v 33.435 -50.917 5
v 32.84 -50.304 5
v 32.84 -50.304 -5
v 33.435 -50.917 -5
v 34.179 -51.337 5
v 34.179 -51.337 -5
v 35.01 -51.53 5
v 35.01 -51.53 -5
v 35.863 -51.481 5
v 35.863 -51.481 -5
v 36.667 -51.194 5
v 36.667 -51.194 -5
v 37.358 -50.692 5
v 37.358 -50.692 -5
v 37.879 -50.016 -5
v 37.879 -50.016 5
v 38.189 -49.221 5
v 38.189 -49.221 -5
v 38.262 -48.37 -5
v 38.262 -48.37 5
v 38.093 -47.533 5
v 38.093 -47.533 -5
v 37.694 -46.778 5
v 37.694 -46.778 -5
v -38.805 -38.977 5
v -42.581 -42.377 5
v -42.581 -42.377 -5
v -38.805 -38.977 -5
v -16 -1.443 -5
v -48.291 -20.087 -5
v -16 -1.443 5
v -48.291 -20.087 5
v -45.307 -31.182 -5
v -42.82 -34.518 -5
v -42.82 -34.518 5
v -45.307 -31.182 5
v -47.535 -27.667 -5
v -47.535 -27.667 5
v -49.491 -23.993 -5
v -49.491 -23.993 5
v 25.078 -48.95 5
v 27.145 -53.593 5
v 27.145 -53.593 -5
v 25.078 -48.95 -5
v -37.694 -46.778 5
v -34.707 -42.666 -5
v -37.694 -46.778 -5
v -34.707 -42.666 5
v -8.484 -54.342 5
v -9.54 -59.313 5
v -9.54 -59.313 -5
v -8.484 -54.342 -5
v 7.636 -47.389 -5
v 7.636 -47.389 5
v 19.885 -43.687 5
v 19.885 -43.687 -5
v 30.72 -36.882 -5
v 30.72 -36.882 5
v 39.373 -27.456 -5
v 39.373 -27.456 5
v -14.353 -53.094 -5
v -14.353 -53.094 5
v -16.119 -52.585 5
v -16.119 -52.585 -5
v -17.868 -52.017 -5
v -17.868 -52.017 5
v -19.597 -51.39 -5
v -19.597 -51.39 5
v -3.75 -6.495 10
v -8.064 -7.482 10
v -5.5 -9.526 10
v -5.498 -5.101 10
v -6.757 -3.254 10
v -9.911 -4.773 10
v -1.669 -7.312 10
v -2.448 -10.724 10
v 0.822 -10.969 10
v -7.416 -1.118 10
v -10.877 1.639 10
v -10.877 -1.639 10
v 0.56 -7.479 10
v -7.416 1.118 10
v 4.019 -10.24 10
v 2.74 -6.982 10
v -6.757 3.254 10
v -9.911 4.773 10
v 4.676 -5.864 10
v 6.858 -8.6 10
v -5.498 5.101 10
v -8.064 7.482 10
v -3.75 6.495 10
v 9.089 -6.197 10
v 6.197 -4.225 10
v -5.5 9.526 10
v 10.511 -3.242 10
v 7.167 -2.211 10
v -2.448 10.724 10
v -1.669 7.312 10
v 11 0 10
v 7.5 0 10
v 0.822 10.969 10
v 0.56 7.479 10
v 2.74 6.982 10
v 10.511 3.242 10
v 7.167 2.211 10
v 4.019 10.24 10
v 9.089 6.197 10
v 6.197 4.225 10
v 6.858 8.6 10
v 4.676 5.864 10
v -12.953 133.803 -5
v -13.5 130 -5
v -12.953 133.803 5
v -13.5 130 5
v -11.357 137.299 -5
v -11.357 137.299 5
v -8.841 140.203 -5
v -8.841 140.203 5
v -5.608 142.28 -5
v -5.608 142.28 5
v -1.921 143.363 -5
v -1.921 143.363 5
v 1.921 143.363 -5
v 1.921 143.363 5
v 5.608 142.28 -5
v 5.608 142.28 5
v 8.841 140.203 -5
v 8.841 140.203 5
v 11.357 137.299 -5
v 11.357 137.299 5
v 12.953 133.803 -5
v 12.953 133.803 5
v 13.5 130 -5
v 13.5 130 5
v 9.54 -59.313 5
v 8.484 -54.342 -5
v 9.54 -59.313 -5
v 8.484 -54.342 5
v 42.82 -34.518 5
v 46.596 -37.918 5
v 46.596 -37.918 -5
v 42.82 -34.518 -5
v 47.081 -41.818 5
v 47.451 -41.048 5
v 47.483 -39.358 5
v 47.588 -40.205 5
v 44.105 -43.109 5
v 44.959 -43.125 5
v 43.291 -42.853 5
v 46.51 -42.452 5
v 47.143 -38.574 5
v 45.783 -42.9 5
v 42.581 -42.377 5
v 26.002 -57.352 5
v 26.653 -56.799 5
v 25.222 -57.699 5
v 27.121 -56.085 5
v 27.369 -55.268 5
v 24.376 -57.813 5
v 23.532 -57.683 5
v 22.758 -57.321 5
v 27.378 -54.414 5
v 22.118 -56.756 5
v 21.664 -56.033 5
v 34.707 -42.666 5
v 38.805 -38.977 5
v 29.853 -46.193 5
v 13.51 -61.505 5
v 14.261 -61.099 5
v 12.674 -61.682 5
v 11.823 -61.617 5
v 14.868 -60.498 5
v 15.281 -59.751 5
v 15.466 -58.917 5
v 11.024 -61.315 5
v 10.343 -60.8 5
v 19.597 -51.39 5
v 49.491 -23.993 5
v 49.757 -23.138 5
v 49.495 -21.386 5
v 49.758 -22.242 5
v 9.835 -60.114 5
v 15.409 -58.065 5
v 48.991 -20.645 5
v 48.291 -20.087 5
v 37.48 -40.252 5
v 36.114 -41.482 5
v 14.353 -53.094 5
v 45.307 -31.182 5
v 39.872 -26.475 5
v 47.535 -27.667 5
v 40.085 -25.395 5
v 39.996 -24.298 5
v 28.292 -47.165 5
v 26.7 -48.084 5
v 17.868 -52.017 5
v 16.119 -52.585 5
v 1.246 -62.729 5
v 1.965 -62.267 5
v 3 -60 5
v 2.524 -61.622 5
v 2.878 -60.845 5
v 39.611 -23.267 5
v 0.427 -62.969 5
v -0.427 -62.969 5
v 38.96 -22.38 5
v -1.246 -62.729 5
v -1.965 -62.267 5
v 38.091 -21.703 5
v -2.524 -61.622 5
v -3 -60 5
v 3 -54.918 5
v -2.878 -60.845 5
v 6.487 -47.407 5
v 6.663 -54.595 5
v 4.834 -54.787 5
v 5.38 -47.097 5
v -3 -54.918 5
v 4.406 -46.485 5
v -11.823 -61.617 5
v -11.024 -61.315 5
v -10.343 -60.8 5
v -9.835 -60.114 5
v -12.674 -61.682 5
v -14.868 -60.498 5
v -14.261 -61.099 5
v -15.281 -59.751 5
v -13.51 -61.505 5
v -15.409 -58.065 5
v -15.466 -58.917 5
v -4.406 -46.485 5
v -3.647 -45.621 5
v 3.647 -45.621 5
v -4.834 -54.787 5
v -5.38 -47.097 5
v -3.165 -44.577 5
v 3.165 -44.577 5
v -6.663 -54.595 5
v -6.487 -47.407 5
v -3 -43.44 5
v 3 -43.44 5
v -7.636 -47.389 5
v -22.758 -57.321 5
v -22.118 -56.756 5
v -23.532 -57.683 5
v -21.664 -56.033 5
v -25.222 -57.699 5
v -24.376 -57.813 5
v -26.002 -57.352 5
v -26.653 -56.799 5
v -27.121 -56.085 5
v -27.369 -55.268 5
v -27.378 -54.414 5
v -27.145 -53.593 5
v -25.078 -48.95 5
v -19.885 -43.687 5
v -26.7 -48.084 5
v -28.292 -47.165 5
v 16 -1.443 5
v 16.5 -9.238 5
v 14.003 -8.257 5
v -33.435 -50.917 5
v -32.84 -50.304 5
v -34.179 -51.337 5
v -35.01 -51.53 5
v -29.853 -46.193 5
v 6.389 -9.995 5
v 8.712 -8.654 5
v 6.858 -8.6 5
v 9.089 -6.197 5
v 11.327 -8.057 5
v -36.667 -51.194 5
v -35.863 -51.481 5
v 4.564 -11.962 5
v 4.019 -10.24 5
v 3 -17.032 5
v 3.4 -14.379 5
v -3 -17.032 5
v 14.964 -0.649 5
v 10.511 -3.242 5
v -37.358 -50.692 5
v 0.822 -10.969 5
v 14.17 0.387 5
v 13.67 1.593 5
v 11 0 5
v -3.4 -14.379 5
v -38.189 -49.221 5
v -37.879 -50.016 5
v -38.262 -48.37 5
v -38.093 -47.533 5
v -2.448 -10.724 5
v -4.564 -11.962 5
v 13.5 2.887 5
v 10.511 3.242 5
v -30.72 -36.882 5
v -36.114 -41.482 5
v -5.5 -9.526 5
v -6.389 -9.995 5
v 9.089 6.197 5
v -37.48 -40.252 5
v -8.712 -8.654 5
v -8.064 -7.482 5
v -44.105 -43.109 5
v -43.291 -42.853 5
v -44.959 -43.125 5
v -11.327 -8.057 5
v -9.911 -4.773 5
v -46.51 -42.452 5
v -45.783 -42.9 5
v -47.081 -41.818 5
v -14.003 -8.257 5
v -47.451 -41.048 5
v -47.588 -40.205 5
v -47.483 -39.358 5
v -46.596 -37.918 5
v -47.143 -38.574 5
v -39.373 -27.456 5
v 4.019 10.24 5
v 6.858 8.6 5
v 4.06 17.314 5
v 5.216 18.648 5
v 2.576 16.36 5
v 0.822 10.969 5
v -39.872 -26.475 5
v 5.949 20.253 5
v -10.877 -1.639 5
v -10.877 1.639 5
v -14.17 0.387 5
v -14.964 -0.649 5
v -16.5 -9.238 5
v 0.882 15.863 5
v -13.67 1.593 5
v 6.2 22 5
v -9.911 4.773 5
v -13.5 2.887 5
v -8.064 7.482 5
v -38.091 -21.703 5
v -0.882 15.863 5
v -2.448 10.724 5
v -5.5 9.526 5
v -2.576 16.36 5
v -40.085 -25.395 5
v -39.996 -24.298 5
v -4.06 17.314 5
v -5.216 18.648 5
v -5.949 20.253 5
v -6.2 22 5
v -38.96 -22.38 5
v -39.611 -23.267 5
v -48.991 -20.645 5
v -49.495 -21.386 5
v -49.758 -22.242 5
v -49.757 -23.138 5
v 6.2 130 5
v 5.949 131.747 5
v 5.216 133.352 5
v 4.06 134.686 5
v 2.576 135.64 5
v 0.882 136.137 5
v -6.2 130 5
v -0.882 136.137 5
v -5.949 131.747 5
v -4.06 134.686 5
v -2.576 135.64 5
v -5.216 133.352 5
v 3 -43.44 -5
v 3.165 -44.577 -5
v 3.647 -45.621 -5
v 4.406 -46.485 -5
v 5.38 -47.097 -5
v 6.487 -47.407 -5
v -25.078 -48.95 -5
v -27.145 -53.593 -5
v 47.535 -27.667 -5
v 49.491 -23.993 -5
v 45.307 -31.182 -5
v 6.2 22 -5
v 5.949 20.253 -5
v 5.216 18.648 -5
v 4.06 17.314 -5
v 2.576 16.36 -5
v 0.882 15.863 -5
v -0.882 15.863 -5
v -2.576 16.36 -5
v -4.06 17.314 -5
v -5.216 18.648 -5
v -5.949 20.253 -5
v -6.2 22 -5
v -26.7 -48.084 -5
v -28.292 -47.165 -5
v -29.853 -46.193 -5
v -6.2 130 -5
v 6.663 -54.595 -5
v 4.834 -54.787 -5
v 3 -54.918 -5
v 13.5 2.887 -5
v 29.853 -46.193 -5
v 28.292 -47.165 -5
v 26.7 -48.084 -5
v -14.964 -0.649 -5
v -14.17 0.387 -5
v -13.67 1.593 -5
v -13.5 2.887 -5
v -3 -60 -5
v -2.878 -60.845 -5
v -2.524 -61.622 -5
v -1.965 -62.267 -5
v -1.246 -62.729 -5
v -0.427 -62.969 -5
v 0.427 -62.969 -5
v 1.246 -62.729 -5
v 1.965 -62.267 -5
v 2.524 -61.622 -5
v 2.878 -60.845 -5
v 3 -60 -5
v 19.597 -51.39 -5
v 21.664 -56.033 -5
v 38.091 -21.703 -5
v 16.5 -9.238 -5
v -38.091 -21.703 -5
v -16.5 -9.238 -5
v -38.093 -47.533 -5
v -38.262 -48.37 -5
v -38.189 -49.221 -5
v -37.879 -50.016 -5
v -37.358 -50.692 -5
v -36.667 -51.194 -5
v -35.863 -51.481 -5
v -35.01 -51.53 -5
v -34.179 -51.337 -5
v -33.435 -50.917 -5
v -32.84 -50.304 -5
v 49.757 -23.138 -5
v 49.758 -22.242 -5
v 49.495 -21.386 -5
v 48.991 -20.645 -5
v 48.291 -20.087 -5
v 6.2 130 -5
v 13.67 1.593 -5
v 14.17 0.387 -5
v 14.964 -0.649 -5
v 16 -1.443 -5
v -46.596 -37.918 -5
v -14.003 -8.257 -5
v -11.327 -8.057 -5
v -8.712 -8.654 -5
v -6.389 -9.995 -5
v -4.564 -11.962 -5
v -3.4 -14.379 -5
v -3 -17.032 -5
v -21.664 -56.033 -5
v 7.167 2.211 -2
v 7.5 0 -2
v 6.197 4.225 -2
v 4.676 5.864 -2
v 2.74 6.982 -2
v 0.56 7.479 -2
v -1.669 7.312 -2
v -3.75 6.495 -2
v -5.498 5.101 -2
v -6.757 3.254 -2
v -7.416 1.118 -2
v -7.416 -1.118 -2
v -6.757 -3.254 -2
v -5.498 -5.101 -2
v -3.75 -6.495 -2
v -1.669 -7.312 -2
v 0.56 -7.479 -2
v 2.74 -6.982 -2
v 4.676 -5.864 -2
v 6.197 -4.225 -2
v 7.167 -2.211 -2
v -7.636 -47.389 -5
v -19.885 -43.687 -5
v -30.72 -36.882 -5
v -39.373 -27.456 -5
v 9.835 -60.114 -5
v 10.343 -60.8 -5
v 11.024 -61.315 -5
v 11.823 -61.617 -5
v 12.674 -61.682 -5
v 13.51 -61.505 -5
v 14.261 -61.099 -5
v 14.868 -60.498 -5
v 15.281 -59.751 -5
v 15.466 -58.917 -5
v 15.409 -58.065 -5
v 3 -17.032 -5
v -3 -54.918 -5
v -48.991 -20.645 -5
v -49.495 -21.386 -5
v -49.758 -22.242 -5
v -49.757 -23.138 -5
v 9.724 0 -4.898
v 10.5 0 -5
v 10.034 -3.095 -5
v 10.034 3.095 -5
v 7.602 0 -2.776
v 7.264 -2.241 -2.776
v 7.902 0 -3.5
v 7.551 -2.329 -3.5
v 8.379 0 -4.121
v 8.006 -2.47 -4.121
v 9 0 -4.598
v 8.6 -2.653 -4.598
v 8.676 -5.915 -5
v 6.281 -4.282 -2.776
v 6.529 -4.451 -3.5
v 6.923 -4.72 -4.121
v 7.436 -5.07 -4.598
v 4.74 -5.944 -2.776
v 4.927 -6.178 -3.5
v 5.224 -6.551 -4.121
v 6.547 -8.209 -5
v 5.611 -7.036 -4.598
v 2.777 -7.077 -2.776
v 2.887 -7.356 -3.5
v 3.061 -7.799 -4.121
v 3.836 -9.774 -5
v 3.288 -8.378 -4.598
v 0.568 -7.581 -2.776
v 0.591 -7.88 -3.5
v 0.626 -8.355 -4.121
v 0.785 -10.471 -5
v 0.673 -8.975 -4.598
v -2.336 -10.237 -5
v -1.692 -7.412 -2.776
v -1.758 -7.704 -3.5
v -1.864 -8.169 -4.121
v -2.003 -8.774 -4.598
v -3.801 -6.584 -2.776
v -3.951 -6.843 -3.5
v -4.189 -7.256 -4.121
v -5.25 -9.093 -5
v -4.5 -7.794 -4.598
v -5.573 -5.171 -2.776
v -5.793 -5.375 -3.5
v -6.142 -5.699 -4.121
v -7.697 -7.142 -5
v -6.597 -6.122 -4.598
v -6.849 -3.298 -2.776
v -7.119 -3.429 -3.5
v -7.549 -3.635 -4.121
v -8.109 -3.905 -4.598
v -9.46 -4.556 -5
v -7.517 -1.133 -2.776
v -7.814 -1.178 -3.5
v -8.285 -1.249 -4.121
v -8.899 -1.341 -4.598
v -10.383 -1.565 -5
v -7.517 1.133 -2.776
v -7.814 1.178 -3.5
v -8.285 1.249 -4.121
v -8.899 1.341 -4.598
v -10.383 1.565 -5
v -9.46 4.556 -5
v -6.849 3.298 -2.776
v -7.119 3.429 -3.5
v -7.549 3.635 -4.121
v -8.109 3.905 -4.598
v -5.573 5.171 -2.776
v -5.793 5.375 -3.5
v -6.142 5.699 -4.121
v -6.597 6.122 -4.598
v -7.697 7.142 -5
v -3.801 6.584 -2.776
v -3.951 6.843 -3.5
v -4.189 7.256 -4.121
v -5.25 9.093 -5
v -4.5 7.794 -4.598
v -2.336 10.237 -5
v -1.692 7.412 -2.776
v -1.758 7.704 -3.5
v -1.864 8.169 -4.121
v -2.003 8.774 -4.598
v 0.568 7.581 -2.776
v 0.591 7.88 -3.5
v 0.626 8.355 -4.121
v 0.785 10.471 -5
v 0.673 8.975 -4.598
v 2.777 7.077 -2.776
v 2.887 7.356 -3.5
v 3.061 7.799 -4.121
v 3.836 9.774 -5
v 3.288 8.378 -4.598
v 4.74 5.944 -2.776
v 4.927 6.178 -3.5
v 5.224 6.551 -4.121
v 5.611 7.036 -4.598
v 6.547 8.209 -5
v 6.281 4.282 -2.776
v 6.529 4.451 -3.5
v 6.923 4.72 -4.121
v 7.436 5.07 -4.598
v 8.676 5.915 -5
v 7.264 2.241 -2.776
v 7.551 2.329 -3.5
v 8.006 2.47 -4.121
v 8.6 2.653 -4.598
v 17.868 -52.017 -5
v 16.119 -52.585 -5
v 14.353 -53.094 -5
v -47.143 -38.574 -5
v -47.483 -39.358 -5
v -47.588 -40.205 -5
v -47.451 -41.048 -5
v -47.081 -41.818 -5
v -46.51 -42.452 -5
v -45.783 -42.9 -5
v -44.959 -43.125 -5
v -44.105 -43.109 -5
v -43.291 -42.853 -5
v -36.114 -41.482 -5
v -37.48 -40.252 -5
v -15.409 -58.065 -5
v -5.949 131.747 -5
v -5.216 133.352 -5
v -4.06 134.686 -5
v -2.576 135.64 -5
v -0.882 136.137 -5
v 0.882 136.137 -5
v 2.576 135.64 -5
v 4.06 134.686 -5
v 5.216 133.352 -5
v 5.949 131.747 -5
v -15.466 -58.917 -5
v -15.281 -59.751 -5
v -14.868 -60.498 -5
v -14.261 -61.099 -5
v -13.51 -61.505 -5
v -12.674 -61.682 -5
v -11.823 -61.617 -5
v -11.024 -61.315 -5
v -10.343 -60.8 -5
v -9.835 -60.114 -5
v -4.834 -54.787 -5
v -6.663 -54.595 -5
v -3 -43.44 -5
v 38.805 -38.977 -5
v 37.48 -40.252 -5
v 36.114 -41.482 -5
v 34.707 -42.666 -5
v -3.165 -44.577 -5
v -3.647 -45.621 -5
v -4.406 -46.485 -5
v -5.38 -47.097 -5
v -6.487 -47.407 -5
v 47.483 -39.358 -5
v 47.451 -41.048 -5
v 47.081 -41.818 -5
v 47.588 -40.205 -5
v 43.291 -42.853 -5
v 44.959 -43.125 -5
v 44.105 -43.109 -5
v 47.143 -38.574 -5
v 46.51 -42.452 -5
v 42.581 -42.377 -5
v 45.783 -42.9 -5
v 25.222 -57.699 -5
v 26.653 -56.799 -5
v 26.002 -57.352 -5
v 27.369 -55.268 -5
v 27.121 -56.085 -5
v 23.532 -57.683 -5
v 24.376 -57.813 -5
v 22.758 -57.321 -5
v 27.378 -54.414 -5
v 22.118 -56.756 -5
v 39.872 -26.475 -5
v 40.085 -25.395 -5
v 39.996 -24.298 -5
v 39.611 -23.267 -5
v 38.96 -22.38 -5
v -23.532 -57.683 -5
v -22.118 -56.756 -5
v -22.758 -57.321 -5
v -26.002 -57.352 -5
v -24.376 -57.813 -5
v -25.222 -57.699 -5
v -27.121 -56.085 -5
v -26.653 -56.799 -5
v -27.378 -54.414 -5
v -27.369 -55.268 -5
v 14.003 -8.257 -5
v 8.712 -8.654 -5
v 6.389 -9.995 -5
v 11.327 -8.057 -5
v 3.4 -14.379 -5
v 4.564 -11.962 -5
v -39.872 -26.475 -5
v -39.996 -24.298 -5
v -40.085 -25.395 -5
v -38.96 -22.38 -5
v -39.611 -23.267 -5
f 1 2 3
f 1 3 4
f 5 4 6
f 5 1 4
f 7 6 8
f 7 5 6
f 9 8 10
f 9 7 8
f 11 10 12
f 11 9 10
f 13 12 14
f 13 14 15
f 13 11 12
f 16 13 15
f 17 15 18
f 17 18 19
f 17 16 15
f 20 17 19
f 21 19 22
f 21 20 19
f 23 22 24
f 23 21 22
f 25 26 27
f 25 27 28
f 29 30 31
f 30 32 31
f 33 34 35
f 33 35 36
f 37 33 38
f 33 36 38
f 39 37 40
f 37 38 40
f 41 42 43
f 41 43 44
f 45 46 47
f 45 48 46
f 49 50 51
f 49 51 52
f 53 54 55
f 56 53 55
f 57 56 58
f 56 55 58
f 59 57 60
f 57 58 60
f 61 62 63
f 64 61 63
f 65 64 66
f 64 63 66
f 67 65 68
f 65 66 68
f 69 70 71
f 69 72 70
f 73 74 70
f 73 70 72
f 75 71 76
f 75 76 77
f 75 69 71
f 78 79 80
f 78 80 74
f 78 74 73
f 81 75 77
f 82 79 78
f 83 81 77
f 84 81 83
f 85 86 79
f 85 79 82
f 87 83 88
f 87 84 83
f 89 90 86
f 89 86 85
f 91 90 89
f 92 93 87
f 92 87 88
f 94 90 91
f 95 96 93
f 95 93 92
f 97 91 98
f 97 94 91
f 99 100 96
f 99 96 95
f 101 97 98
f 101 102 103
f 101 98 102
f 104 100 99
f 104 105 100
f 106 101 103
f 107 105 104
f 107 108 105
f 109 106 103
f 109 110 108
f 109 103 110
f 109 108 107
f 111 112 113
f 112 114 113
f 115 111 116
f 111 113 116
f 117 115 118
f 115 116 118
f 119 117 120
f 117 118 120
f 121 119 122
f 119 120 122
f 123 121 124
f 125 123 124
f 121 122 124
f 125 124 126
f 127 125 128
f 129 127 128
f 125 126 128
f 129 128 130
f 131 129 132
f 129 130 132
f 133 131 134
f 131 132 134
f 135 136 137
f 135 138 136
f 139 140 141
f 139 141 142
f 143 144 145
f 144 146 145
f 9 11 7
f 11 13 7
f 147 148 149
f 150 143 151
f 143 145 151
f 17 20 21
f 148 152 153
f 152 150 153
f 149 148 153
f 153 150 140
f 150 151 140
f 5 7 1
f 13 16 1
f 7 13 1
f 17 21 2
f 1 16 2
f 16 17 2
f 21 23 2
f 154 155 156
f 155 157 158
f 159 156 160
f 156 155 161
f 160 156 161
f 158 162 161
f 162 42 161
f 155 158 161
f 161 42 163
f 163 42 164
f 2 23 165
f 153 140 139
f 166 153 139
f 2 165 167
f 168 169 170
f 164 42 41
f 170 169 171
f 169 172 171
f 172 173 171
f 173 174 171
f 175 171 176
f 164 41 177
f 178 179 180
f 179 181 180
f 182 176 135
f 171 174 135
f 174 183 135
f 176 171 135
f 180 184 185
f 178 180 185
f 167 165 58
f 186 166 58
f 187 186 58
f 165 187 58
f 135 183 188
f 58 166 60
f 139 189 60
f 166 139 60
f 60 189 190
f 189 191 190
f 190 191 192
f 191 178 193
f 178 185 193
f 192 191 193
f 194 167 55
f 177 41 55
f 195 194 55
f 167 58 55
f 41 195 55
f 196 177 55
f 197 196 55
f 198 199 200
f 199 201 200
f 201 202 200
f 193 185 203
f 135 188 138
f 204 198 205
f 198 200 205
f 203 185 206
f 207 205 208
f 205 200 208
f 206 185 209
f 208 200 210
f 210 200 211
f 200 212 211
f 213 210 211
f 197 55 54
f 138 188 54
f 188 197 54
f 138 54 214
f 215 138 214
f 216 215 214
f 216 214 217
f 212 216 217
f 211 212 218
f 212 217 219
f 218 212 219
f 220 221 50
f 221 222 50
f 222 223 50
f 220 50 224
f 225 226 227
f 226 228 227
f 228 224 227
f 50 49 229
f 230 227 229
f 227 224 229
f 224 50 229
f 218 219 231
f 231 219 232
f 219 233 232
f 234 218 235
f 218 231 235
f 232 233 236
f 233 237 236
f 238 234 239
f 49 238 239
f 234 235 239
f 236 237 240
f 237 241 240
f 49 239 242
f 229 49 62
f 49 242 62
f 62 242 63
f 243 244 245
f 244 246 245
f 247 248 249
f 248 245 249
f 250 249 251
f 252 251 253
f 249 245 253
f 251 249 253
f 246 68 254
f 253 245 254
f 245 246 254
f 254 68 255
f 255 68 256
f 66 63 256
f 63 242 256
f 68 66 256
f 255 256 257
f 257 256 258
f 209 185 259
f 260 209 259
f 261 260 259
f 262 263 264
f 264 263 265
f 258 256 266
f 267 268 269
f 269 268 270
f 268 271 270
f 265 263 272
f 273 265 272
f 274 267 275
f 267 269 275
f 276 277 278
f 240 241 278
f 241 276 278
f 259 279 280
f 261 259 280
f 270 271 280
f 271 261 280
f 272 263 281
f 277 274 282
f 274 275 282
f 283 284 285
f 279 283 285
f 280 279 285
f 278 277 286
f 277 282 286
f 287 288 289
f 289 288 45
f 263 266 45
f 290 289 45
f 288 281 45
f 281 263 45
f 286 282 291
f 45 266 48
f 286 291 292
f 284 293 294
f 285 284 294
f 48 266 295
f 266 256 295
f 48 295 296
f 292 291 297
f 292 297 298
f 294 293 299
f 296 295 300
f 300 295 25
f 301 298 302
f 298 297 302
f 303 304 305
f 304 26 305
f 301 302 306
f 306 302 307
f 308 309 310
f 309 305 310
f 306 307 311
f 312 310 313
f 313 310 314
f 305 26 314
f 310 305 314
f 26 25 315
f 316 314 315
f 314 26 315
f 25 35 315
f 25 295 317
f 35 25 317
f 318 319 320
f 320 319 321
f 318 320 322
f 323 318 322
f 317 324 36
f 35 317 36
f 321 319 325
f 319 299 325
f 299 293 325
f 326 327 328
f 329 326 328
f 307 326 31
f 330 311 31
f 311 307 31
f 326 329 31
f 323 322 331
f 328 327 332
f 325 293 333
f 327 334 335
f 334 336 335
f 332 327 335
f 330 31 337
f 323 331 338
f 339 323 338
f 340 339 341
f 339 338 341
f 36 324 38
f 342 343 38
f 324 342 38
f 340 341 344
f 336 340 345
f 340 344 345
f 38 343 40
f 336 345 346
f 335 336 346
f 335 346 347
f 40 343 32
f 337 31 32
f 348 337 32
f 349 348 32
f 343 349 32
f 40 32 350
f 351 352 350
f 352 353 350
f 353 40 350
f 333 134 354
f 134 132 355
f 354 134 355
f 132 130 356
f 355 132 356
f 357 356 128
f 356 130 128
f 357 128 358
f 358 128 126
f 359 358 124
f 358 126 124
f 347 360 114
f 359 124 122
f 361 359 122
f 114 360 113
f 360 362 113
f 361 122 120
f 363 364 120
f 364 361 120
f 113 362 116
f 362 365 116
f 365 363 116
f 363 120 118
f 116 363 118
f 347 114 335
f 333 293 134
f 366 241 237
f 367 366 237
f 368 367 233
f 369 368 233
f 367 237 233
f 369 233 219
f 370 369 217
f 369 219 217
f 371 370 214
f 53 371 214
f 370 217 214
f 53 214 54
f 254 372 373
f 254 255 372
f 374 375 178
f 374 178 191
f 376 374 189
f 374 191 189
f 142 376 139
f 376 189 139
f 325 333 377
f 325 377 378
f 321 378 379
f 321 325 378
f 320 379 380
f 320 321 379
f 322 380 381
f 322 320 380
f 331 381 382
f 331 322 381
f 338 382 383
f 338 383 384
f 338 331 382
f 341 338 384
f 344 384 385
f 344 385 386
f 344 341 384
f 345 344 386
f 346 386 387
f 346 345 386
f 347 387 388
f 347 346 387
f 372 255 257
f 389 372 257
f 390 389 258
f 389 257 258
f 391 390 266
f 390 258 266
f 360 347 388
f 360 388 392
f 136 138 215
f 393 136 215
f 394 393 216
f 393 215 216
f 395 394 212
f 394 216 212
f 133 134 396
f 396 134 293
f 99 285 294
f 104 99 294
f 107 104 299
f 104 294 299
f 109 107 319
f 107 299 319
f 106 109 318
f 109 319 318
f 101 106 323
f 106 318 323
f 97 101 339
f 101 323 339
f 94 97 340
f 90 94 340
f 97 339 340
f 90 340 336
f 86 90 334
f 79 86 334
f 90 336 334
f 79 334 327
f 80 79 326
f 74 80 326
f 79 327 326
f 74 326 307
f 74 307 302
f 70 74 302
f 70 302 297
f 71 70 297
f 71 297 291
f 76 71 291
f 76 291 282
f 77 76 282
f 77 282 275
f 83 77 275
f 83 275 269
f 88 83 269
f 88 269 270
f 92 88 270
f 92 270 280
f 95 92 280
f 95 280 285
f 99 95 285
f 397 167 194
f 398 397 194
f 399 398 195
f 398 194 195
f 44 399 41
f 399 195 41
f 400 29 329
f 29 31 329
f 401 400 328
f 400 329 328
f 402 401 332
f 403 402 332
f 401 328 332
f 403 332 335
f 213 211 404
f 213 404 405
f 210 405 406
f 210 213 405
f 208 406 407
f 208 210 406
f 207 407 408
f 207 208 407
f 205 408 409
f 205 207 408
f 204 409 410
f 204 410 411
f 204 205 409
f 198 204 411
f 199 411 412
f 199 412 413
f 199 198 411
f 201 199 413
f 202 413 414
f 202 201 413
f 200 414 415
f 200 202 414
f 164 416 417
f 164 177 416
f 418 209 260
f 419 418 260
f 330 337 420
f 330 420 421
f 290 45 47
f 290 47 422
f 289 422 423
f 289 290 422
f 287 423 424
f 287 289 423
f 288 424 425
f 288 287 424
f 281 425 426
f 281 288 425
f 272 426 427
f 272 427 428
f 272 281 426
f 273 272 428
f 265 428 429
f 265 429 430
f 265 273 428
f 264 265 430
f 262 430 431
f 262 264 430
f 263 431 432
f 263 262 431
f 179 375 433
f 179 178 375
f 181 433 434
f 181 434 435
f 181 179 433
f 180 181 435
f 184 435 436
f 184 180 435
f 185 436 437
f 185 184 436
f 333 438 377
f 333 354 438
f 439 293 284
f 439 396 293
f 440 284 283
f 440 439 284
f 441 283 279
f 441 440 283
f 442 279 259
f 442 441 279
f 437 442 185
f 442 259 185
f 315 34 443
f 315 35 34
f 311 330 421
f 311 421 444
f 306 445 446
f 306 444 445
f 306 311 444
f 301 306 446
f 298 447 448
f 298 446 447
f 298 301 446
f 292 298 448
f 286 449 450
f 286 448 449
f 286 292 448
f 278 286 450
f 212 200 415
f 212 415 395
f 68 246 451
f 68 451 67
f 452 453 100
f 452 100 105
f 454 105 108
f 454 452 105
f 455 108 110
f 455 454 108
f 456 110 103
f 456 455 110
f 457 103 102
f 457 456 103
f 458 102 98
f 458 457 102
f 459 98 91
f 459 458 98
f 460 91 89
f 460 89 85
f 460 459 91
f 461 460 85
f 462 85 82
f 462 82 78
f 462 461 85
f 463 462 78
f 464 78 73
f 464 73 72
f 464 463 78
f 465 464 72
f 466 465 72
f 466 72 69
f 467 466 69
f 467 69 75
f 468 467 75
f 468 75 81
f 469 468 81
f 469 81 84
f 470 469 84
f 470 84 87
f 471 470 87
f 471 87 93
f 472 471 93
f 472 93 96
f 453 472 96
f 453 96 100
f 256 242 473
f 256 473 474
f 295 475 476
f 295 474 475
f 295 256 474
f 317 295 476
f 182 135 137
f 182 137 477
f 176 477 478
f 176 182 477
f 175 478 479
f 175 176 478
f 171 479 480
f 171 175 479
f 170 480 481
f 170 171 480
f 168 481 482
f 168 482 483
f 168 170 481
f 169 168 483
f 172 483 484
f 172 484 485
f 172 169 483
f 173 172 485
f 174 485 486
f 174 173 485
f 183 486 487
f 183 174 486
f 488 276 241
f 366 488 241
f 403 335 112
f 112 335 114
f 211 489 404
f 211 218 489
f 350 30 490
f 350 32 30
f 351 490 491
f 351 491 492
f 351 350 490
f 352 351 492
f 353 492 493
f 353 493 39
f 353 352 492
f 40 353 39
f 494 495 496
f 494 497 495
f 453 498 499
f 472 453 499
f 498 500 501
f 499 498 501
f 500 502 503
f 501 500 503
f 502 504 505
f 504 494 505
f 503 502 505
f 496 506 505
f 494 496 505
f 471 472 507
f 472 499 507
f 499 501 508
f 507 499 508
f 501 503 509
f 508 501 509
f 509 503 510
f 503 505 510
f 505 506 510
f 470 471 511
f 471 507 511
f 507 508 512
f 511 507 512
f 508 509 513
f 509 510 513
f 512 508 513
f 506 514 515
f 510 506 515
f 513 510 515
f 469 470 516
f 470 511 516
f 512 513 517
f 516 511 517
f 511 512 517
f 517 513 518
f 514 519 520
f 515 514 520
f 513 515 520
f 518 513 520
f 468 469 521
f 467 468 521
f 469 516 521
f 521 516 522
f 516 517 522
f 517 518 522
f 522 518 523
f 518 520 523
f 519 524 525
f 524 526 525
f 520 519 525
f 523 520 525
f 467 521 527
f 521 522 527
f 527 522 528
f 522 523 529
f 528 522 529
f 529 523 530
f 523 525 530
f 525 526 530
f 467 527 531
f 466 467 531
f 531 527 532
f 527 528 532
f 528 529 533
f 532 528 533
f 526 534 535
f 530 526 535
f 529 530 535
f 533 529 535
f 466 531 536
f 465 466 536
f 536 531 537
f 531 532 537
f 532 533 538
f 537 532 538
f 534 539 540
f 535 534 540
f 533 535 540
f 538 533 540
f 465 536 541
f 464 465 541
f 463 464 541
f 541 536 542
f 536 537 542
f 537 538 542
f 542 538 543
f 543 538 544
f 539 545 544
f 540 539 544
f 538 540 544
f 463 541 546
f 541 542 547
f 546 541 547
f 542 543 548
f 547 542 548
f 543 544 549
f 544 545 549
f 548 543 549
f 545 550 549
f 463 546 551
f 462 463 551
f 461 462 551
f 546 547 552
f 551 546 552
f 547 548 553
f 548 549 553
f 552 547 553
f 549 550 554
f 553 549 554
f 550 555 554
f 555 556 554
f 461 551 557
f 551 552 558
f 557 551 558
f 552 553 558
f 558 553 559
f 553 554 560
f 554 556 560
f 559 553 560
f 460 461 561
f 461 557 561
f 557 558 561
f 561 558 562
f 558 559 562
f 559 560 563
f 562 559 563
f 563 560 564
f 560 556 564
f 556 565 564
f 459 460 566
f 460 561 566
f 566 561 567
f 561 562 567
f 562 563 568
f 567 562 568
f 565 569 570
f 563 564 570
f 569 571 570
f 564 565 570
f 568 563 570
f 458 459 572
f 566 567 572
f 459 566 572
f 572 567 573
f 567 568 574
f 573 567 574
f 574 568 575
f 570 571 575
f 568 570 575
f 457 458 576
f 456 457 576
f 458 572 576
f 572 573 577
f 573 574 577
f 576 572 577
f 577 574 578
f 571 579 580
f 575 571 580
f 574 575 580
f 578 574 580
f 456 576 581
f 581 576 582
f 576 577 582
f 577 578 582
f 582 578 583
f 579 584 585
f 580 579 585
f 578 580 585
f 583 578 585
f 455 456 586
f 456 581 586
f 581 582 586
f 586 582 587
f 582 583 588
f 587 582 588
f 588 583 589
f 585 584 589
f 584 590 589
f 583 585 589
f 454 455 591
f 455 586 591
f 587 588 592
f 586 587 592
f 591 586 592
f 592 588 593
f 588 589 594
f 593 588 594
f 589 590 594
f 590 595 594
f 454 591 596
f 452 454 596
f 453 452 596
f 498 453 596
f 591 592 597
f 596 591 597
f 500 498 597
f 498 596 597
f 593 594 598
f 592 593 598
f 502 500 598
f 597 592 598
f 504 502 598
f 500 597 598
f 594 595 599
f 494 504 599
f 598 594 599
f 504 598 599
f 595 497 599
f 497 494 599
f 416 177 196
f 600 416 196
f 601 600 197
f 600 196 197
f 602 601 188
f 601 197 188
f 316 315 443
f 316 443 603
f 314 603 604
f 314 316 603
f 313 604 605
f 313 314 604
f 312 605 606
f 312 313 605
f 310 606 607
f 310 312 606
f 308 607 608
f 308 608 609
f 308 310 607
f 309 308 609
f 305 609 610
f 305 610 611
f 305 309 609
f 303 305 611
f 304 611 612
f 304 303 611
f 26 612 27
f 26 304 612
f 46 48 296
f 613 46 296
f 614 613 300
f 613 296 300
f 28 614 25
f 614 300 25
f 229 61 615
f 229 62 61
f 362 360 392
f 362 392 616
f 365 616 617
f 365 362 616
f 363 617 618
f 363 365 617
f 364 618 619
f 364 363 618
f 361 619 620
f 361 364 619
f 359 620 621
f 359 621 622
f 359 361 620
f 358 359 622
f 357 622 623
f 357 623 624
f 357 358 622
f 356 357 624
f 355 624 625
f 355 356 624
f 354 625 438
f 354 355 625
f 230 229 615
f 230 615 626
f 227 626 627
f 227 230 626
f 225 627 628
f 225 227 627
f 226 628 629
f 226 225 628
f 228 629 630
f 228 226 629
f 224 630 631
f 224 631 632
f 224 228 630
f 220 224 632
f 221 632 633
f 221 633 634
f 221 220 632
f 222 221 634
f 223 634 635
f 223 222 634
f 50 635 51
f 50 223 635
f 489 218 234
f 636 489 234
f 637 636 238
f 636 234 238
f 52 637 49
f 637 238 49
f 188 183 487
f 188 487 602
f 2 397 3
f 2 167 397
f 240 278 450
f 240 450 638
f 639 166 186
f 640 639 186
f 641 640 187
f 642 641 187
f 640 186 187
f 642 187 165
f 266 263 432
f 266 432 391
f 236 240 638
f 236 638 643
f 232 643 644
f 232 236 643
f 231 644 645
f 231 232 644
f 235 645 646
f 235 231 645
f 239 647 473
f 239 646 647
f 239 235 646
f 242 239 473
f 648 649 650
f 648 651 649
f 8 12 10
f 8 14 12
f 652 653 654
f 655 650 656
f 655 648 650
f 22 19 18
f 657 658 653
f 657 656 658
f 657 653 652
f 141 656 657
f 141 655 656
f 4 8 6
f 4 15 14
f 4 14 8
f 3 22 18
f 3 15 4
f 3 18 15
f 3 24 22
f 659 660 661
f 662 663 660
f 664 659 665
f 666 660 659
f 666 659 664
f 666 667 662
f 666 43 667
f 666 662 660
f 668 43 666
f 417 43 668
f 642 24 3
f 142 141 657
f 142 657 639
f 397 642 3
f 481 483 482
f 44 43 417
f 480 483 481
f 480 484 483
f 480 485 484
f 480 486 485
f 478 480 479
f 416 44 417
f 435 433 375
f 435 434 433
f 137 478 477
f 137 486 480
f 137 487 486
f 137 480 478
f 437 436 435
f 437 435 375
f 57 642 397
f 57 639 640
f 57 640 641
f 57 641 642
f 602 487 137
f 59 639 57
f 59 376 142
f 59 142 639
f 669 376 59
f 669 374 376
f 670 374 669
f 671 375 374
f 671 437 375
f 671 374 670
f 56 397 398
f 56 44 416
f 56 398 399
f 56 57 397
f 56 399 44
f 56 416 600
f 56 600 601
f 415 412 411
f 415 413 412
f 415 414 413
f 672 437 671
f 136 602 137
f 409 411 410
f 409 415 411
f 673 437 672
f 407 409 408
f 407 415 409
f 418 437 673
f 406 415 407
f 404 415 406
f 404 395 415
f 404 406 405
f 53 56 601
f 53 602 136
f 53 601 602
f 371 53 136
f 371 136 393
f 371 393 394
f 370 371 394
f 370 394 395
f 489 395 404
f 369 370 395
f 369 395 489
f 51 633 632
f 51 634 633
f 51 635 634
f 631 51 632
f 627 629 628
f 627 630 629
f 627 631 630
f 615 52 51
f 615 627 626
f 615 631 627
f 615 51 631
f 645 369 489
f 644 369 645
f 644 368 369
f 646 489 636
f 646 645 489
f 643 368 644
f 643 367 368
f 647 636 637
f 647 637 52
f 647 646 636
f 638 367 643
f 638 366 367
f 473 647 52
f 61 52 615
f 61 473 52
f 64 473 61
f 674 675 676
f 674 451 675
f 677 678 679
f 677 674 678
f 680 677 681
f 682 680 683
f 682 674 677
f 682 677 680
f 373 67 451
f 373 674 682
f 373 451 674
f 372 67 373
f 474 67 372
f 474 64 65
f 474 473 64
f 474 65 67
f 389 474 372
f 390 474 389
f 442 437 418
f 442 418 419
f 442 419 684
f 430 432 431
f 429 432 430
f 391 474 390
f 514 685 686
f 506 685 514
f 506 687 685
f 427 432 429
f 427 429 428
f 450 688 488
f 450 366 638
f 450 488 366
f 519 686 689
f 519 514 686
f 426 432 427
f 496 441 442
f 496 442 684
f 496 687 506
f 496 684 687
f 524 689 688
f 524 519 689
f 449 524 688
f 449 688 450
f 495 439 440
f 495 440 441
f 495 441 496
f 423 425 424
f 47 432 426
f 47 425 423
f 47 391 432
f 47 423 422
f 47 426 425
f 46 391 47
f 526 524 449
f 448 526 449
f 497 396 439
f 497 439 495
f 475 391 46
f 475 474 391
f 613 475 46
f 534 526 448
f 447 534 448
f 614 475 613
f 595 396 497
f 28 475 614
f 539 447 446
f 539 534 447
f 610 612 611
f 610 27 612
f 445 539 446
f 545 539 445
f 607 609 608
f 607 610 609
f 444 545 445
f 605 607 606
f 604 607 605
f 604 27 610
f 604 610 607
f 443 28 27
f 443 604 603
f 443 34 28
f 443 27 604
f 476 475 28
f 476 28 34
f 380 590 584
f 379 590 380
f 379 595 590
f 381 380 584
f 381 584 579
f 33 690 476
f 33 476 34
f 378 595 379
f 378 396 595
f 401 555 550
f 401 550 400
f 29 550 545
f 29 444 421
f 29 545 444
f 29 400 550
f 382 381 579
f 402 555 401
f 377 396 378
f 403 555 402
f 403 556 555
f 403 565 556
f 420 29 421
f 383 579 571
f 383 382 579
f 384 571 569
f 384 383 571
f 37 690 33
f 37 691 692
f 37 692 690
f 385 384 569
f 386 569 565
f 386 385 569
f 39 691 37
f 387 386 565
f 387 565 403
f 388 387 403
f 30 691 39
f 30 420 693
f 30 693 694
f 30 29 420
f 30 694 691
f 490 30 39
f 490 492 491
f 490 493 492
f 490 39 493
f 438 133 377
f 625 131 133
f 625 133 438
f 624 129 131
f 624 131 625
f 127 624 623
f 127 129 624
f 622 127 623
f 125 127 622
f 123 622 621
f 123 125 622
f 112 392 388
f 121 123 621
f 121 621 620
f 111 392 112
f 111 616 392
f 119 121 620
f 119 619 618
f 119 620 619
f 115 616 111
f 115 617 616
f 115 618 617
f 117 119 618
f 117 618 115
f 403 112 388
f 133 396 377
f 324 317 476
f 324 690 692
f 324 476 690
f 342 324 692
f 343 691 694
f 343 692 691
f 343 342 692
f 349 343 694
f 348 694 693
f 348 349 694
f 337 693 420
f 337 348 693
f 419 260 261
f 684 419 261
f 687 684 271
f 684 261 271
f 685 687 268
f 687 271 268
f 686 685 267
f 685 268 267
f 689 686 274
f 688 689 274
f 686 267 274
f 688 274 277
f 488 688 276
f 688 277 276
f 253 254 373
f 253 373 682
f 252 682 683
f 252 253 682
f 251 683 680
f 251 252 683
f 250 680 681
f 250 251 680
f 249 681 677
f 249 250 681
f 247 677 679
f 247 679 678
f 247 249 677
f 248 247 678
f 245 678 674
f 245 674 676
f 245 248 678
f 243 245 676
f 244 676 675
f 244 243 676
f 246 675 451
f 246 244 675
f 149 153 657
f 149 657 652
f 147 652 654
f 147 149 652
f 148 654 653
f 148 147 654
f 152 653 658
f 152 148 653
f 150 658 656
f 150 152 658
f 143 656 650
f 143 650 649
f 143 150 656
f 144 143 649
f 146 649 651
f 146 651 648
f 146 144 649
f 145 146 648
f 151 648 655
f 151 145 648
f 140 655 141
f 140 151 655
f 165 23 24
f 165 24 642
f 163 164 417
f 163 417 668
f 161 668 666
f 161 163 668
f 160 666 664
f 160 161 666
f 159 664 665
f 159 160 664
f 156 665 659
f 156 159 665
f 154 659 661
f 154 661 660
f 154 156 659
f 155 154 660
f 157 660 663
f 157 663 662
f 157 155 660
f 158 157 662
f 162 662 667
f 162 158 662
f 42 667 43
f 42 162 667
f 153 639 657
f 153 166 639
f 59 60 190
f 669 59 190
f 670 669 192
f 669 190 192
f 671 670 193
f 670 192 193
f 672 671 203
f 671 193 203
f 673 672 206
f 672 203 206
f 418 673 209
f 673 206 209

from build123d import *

# Parameters (mm, degrees)
BOSS_EXTRUDE1_DEPTH             = 5
SKETCH5_R                       = 11
SKETCH5_R_2                     = 7.5
BOSS_EXTRUDE3_DEPTH             = 10
CUT_EXTRUDE2_DEPTH              = 153.503443209
CUT_EXTRUDE2_DEPTH_BACK         = 153.503443209
SKETCH5_2_R                     = 7.5
FILLET1_R                       = 3
FILLET2_R                       = 3
FILLET3_R                       = 5
BOSS_EXTRUDE4_DEPTH             = 5
CIRPATTERN1_COUNT               = 5
CIRPATTERN1_ANGLE               = 48
CIRPATTERN1_THE_OTHER_WAY_COUNT = 5
CIRPATTERN1_THE_OTHER_WAY_ANGLE = 48
CUT_EXTRUDE3_DEPTH              = 153.221550408


with BuildPart() as part:
    # Sketch1 → Boss-Extrude1 (new, symmetric)
    with BuildSketch(Plane.XY):
        with BuildLine():
            Line((-13.5, 0), (-13.5, 130))
            ThreePointArc((-13.5, 130), (0, 143.5), (13.5, 130))
            Line((13.5, 130), (13.5, 0))
            Line((13.5, 0), (50.646324553, -21.44644048))
            ThreePointArc((50.646324553, -21.44644048), (0, -55), (-50.646324553, -21.44644048))
            Line((-50.646324553, -21.44644048), (-13.5, 0))
        make_face()
        with BuildLine():
            Line((6.2, 130), (6.2, 22))
            ThreePointArc((6.2, 22), (0, 15.8), (-6.2, 22))
            Line((-6.2, 22), (-6.2, 130))
            ThreePointArc((-6.2, 130), (0, 136.2), (6.2, 130))
        make_face(mode=Mode.SUBTRACT)
    extrude(amount=BOSS_EXTRUDE1_DEPTH, both=True)

    # Sketch5 → Boss-Extrude3 (add)
    with BuildSketch(Plane.XY):
        Circle(SKETCH5_R)
        Circle(SKETCH5_R_2, mode=Mode.SUBTRACT)
    extrude(amount=BOSS_EXTRUDE3_DEPTH)

    # Sketch5<2> → Cut-Extrude2 (cut, two sides: drawn at the far end of the back side and taken through both)
    with BuildSketch(Plane.XY.offset(-CUT_EXTRUDE2_DEPTH_BACK)):
        Circle(SKETCH5_2_R)
    extrude(amount=CUT_EXTRUDE2_DEPTH + CUT_EXTRUDE2_DEPTH_BACK, mode=Mode.SUBTRACT)

    # Fillet1
    fillet1_edges = [part.edges().sort_by_distance(p)[0] for p in [
        (-7.5, 0, -5),
    ]]
    fillet(fillet1_edges, radius=FILLET1_R)

    # Fillet2
    fillet2_edges = [part.edges().sort_by_distance(p)[0] for p in [
        (50.646324553, -21.44644048, 0),
        (-50.646324553, -21.44644048, 0),
    ]]
    fillet(fillet2_edges, radius=FILLET2_R)

    # Fillet3
    fillet3_edges = [part.edges().sort_by_distance(p)[0] for p in [
        (13.5, 0, 0),
        (-13.5, 0, 0),
    ]]
    fillet(fillet3_edges, radius=FILLET3_R)

    # Sketch4 → Boss-Extrude4 (add, symmetric)
    with BuildSketch(Plane.XY):
        with BuildLine():
            Line((-3, -54.918120871), (-3, -60))
            ThreePointArc((-3, -60), (0, -63), (3, -60))
            Line((3, -60), (3, -54.918120871))
            ThreePointArc((3, -54.918120871), (0, -55), (-3, -54.918120871))
        make_face()
    boss_extrude4 = extrude(amount=BOSS_EXTRUDE4_DEPTH, both=True)

    # CirPattern1: Boss-Extrude4 ×5 about axis
    cirpattern1_axis = Axis((0, 0, 0), (0, 0, 1))
    for i in range(1, CIRPATTERN1_COUNT):
        add(boss_extrude4.rotate(cirpattern1_axis, i * CIRPATTERN1_ANGLE / (CIRPATTERN1_COUNT - 1)))

    # CirPattern1 the other way: Boss-Extrude4 ×5 about axis
    cirpattern1_the_other_way_axis = Axis((0, 0, 0), (0, 0, -1))
    for i in range(1, CIRPATTERN1_THE_OTHER_WAY_COUNT):
        add(boss_extrude4.rotate(cirpattern1_the_other_way_axis, i * CIRPATTERN1_THE_OTHER_WAY_ANGLE / (CIRPATTERN1_THE_OTHER_WAY_COUNT - 1)))

    # Sketch6 → Cut-Extrude3 (cut, symmetric)
    with BuildSketch(Plane.XY):
        with BuildLine():
            Line((-3, -17.031832941), (-3, -43.439613258))
            ThreePointArc((-3, -43.439613258), (-4.406301342, -46.484728571), (-7.636363636, -47.388669009))
            ThreePointArc((-7.636363636, -47.388669009), (-25.530206329, -40.647368486), (-39.372516761, -27.45550808))
            ThreePointArc((-39.372516761, -27.45550808), (-39.995817984, -24.298011443), (-38.091473697, -21.703447458))
            Line((-38.091473697, -21.703447458), (-16.5, -9.237604307))
            ThreePointArc((-16.5, -9.237604307), (-7.5, -9.237604307), (-3, -17.031832941))
        make_face()
    cut_extrude3 = extrude(amount=CUT_EXTRUDE3_DEPTH, both=True, mode=Mode.SUBTRACT)

    # Mirror1: Cut-Extrude3 across plane
    add(cut_extrude3.mirror(Plane(origin=(0, 0, 0), x_dir=(0, 0, 1), z_dir=(1, 0, 0))), mode=Mode.SUBTRACT)


solid = part.part
